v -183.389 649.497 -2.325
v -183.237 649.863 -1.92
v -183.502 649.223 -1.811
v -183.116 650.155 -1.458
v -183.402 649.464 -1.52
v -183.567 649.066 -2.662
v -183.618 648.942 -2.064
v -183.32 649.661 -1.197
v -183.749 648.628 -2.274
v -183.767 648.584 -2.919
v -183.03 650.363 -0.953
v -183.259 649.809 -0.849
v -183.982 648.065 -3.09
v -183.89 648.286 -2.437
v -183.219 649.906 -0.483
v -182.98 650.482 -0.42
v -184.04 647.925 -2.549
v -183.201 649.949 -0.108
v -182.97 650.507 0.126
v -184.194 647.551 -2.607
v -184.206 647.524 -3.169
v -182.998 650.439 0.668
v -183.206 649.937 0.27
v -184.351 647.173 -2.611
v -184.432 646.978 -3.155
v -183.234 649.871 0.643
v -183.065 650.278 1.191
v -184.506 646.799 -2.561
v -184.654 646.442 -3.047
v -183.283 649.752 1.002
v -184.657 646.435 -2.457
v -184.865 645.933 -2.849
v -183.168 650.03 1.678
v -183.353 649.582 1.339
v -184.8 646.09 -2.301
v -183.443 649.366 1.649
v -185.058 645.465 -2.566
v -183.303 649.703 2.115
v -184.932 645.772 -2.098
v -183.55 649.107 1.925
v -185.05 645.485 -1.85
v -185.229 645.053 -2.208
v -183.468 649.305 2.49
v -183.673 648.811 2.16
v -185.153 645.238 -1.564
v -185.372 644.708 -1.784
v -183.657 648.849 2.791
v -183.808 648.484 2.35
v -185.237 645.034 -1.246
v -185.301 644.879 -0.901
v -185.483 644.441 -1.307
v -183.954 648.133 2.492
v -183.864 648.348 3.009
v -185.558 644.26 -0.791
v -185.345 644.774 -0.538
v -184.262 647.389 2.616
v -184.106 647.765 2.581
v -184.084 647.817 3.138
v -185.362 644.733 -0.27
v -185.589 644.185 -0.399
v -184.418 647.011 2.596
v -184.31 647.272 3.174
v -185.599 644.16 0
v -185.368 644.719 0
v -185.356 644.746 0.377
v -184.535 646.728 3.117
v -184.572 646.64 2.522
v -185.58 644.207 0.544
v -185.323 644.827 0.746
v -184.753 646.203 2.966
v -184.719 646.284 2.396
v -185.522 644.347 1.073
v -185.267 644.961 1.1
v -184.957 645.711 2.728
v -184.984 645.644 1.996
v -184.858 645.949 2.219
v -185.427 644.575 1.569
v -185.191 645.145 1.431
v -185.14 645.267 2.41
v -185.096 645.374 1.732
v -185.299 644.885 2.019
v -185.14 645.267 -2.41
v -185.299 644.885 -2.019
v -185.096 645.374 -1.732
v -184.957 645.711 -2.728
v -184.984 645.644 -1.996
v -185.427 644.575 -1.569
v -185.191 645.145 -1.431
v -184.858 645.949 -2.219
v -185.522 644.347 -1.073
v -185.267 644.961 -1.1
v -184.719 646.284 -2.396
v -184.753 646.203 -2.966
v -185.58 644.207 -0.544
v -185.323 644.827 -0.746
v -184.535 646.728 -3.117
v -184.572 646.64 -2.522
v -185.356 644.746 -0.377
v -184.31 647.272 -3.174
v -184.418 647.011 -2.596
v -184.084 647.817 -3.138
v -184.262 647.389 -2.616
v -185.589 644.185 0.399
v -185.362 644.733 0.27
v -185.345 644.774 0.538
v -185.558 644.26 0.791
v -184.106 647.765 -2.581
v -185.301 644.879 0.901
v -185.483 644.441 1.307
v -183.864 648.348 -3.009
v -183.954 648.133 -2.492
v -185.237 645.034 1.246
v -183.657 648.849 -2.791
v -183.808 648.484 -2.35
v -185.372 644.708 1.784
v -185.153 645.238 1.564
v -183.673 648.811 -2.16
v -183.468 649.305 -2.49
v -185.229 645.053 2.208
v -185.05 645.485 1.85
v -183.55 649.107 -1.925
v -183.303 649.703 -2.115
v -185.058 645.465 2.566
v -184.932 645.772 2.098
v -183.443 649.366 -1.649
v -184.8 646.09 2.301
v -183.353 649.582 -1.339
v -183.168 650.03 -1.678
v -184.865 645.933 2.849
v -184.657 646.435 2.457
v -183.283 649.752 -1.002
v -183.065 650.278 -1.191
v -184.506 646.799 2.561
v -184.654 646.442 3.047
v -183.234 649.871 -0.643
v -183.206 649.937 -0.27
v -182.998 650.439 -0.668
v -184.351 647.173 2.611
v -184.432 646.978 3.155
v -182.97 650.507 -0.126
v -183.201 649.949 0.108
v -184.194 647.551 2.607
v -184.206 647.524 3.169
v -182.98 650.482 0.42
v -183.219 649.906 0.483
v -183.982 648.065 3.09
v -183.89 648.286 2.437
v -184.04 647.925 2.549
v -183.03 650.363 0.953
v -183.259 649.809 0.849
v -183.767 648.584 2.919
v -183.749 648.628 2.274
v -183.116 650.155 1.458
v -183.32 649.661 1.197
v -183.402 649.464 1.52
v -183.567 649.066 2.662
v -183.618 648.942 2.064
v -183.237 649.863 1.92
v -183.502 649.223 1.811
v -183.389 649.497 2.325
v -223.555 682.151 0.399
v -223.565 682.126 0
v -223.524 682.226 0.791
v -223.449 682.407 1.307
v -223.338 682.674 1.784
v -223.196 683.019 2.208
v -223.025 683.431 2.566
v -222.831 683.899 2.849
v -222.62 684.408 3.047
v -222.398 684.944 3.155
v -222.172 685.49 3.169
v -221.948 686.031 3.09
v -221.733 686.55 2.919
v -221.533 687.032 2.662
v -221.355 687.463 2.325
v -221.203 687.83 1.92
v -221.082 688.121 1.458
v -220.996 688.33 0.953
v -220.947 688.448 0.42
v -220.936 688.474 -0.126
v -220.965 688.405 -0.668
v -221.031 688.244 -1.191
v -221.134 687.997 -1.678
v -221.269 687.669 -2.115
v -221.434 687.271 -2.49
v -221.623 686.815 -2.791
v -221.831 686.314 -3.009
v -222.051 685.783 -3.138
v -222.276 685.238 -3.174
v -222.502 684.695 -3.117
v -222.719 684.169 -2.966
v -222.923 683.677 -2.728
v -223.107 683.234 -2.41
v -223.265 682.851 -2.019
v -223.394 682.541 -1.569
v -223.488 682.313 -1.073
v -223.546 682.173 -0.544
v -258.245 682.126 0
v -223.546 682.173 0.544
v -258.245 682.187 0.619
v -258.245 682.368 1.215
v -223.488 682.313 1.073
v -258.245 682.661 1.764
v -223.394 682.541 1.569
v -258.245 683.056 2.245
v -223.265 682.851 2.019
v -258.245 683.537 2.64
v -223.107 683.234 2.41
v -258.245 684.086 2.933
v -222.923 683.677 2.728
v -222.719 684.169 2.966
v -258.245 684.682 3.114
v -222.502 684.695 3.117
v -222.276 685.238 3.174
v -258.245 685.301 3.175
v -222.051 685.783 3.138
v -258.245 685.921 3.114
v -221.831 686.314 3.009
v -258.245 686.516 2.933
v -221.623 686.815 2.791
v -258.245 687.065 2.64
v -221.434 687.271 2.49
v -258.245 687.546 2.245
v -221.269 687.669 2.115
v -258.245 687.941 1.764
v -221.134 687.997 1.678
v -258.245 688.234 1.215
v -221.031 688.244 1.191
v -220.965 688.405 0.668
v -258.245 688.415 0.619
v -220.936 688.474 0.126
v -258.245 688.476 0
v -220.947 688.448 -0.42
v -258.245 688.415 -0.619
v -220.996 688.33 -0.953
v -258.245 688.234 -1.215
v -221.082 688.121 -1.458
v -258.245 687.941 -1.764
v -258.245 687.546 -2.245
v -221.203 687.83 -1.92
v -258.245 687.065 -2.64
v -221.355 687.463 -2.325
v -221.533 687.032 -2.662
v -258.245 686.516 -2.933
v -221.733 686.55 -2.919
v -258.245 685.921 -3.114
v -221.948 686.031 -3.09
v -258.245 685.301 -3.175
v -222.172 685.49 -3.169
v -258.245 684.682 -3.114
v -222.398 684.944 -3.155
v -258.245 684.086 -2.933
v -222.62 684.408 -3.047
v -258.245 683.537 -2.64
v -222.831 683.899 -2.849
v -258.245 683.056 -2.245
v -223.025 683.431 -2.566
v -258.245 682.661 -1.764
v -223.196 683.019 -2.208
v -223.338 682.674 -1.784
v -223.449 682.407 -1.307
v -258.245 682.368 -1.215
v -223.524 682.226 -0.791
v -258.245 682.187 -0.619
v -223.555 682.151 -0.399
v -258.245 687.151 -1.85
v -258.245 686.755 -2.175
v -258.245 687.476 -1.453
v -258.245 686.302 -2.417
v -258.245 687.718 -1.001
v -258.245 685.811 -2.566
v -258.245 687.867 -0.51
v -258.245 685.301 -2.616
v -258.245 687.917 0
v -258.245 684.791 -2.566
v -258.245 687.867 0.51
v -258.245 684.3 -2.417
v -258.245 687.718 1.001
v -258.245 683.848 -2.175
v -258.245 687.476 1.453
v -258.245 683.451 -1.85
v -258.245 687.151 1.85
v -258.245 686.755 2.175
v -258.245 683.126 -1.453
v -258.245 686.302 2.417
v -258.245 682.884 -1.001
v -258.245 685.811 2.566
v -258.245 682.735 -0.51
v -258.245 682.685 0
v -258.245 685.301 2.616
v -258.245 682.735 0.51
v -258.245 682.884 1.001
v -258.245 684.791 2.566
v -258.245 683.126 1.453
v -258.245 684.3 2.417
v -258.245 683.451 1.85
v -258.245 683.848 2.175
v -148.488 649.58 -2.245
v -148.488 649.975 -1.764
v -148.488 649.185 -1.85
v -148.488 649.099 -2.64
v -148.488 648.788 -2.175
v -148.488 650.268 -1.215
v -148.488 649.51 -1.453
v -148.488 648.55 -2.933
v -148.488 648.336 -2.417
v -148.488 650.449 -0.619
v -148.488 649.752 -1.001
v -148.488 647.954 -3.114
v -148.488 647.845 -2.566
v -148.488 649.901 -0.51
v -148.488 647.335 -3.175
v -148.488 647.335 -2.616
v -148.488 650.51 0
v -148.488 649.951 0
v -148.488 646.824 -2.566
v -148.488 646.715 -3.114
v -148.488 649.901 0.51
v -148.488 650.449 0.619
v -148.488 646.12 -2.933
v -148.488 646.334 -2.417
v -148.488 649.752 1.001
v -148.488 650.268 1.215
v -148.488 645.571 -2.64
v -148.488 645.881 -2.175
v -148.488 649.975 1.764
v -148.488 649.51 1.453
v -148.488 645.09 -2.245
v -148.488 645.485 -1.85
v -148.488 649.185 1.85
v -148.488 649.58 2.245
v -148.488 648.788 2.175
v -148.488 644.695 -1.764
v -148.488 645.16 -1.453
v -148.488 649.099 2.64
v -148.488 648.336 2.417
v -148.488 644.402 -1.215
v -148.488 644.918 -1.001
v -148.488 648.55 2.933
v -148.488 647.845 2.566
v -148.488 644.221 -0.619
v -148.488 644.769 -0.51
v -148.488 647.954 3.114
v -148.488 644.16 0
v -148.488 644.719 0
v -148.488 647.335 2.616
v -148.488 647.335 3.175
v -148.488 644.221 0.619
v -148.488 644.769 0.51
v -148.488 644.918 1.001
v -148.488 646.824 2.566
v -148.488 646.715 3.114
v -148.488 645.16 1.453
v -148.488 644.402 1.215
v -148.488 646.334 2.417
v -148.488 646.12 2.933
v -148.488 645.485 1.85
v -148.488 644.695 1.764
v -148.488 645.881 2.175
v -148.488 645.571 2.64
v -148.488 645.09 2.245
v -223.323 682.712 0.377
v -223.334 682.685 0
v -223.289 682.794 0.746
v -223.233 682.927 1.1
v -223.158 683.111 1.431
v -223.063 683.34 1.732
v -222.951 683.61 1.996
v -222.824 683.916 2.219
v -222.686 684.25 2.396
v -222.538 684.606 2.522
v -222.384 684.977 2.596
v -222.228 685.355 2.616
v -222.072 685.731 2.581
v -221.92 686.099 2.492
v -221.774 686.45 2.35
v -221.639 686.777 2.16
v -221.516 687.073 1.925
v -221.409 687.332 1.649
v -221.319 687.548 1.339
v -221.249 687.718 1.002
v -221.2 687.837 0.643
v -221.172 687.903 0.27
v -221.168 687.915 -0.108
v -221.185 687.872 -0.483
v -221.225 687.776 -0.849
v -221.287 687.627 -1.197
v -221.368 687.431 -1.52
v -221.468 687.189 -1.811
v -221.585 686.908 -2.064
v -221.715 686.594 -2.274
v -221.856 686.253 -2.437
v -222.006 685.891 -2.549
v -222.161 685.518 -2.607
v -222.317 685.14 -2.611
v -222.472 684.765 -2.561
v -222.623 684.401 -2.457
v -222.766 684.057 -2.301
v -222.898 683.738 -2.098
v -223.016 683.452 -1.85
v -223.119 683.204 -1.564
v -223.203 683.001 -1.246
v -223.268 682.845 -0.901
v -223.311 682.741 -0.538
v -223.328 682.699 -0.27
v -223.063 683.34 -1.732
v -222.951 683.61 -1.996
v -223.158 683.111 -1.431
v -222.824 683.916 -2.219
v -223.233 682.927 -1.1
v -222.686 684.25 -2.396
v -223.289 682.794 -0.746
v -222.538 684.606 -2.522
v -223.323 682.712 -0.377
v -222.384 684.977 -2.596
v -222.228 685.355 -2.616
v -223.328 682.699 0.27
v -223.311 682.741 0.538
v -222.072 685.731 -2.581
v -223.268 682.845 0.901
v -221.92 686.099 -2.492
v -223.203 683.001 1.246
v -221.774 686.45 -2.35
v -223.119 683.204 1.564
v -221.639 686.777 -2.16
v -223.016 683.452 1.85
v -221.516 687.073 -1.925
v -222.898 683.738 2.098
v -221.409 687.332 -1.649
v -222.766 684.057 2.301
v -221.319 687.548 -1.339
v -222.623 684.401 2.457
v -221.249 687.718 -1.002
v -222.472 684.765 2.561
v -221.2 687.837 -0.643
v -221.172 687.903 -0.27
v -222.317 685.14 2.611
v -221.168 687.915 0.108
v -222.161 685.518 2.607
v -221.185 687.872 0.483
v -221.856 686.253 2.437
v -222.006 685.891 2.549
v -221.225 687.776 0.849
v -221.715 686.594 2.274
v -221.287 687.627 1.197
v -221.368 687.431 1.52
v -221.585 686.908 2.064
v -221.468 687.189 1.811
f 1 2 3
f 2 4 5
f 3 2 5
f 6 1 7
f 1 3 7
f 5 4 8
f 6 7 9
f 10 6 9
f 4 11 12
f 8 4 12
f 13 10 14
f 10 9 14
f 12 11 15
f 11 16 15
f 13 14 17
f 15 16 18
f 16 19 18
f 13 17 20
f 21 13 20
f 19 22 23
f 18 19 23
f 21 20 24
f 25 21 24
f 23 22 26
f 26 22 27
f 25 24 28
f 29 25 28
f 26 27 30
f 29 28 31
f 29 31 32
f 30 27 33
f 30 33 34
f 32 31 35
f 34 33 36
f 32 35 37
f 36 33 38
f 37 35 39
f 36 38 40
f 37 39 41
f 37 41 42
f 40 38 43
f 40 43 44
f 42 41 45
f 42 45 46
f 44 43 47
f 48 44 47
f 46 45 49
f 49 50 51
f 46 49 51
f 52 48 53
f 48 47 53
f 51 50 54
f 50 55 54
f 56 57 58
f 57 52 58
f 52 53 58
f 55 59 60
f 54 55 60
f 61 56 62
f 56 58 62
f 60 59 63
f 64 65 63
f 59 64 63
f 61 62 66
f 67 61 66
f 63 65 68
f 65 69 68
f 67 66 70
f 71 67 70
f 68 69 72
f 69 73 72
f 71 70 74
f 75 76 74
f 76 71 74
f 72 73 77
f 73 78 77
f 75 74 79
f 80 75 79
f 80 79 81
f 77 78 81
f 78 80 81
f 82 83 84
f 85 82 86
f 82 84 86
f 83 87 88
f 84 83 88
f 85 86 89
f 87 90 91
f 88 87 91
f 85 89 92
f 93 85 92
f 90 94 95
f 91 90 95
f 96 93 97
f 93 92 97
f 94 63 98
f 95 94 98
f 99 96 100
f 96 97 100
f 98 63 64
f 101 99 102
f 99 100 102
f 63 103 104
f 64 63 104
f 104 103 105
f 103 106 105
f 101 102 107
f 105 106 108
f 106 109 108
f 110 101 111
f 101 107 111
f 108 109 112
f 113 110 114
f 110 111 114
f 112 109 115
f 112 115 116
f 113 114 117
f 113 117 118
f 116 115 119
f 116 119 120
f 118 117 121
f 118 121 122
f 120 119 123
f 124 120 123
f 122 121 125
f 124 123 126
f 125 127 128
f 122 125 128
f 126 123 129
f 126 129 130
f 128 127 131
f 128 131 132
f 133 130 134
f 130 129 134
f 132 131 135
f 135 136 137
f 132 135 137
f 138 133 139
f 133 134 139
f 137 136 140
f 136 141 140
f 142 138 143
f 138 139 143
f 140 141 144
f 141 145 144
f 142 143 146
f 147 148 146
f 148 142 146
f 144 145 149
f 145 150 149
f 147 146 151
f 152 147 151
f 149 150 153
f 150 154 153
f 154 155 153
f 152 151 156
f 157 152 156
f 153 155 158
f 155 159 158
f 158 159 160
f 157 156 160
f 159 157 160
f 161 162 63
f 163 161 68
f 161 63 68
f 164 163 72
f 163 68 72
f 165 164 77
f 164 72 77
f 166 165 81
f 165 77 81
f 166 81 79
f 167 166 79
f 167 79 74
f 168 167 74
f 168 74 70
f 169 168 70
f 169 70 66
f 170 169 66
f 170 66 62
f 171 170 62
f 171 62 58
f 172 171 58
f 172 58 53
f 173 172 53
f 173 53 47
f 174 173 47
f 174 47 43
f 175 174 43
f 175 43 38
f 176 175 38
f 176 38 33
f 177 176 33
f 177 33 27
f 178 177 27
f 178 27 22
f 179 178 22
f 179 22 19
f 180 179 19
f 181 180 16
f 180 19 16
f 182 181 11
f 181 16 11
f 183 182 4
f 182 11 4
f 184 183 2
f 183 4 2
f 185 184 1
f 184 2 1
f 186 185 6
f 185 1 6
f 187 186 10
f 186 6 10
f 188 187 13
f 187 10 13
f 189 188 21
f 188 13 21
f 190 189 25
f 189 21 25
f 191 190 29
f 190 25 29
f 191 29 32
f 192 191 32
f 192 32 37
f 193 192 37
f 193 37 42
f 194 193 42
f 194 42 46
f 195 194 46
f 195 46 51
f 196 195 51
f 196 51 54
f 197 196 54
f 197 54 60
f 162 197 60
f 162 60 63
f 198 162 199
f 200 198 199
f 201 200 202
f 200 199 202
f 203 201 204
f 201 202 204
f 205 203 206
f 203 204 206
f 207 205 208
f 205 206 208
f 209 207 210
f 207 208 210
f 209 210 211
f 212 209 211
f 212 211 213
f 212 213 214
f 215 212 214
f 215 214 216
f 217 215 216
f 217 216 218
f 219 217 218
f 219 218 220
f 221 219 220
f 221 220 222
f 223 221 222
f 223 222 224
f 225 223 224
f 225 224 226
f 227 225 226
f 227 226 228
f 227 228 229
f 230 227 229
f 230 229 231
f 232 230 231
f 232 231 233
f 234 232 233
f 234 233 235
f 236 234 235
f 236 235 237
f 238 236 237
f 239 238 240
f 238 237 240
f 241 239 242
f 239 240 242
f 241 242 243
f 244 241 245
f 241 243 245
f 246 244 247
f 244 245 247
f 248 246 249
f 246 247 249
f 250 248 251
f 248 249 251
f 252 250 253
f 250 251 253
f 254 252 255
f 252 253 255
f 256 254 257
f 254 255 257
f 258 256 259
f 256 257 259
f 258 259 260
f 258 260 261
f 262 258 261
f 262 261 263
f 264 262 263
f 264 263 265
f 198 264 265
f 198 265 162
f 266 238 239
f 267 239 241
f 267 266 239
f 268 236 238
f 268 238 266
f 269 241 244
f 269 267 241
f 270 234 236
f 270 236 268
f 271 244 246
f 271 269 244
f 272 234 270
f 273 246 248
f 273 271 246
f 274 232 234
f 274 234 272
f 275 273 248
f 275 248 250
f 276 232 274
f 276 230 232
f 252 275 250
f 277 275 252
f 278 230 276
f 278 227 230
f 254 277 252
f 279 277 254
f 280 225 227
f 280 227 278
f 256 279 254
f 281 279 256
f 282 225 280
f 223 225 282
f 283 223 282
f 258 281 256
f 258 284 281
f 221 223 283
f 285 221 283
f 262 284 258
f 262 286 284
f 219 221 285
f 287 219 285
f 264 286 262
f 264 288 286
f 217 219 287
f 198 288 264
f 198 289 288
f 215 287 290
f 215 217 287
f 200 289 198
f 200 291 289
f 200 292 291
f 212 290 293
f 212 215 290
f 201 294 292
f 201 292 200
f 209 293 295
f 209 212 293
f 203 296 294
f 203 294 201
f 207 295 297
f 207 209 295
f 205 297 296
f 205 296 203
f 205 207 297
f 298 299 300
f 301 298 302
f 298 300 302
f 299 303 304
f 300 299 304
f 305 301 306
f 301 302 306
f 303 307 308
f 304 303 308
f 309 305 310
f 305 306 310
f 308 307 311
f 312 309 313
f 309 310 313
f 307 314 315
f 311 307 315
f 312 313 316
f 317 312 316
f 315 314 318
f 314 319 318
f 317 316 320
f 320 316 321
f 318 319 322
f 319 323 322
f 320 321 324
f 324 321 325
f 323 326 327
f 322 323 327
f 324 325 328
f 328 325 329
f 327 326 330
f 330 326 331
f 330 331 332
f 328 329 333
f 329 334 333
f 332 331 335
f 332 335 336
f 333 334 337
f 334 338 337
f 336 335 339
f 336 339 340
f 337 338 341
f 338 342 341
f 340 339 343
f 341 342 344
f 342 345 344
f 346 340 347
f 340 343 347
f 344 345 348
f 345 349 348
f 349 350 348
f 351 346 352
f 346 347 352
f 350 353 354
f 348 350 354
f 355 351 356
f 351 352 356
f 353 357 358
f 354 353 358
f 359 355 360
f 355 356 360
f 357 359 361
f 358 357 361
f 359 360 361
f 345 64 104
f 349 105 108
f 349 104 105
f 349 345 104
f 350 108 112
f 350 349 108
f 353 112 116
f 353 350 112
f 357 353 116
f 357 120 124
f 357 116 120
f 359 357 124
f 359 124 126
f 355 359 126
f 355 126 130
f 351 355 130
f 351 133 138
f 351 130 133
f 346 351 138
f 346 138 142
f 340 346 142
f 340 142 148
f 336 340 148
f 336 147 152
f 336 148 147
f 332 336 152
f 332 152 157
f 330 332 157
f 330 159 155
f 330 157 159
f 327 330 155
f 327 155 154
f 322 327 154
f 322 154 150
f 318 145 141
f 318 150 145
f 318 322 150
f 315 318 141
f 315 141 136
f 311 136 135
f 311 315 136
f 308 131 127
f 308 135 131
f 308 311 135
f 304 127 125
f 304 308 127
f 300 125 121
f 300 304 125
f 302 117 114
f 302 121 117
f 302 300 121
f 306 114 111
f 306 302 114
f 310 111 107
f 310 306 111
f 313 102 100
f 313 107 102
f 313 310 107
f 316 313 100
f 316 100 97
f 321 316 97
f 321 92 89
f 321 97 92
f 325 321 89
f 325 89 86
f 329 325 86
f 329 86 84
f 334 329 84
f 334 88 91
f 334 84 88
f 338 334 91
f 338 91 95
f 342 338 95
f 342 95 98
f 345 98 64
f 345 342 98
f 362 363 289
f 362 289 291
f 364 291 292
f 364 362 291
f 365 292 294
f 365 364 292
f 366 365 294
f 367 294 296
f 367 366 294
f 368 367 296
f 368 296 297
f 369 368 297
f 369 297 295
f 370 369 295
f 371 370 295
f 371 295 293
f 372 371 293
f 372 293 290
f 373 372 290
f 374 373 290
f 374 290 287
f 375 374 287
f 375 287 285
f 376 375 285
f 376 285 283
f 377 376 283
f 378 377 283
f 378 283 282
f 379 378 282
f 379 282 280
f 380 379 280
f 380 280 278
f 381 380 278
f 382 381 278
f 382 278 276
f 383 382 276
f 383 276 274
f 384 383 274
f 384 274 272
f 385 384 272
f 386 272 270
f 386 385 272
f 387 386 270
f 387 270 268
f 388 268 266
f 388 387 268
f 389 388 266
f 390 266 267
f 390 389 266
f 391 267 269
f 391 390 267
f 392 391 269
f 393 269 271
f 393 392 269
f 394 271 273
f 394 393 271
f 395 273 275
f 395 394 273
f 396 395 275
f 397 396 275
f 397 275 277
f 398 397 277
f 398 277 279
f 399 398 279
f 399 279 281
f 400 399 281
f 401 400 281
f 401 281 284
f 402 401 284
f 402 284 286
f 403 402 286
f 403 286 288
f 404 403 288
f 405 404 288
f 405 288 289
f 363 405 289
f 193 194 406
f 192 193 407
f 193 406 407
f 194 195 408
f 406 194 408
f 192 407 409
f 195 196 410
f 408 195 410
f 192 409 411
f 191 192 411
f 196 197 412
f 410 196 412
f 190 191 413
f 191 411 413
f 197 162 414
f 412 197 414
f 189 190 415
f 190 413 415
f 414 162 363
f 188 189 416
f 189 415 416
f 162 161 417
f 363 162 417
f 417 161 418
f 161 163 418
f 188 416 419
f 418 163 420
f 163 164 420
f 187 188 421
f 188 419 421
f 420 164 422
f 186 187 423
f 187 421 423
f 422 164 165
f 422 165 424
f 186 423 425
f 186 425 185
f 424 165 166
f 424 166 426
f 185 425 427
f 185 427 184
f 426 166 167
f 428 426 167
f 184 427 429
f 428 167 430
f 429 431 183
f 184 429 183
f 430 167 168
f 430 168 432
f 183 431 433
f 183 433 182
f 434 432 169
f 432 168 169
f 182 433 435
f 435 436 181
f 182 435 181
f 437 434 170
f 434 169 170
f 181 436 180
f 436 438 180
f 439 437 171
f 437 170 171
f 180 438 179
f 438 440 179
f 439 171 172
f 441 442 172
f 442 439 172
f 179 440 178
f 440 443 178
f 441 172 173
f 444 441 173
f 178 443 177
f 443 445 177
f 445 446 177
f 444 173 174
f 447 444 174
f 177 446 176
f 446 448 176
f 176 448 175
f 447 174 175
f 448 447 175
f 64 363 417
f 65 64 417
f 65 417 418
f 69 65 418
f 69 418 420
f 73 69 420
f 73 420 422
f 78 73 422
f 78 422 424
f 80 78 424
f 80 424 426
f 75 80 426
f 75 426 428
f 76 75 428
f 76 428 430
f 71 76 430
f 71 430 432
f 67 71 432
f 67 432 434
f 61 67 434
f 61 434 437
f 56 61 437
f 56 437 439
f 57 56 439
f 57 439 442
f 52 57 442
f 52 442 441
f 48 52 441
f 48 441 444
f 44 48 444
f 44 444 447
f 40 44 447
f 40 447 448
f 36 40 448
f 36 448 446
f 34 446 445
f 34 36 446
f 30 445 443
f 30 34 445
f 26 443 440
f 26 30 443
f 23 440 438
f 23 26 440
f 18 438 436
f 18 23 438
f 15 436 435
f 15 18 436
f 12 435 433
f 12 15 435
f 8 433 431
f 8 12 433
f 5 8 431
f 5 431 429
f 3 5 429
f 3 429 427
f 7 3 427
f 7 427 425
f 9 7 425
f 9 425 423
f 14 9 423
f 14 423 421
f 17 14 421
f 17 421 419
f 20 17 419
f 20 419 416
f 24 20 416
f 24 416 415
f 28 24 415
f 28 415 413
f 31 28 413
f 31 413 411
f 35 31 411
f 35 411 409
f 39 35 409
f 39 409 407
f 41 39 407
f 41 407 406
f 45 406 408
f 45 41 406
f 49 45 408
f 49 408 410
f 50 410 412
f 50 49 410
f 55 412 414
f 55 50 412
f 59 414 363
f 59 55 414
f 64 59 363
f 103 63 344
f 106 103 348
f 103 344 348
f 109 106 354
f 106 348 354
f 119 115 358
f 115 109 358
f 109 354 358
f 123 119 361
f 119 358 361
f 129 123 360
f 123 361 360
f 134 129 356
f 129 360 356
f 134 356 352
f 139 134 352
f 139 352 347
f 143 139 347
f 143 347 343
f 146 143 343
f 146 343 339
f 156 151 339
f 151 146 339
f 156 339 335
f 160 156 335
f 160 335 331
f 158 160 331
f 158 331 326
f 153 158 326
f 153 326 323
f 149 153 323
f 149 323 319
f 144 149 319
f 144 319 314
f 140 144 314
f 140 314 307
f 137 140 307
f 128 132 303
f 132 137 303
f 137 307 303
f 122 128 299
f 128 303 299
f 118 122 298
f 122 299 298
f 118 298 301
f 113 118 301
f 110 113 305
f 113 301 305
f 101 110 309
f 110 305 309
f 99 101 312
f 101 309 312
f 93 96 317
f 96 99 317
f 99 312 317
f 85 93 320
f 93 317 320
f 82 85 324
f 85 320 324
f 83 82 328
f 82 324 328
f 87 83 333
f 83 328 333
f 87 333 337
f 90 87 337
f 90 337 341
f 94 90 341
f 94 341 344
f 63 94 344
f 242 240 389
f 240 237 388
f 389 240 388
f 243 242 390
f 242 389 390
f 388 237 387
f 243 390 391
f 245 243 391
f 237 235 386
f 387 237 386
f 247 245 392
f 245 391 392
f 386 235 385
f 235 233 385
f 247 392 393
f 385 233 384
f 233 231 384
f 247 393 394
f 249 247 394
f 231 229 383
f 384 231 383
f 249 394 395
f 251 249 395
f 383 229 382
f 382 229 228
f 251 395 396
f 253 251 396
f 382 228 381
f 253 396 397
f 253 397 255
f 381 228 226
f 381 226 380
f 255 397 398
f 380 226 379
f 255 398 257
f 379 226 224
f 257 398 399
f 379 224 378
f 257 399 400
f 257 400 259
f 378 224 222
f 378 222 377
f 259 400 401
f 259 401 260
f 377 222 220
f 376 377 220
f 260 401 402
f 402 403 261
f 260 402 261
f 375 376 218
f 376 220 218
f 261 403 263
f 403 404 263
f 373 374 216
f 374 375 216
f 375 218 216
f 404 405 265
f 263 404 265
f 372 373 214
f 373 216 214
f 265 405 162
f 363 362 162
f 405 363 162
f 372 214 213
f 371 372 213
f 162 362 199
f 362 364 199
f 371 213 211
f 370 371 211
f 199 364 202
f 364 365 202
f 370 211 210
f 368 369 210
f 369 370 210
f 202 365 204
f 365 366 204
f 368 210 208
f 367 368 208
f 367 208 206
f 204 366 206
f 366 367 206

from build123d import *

# Parameters (mm, degrees)
SKETCH1_ON_SEGMENT_1_R         = 3.175
SKETCH1_ON_SEGMENT_1_R_2       = 2.6162
PIPE_0_5_SCH_40_1_DEPTH        = 38.655870397
SKETCH1_ON_SEGMENT_2_R         = 3.175
SKETCH1_ON_SEGMENT_2_R_2       = 2.6162
PIPE_0_5_SCH_40_1_2_DEPTH      = 59.412113138
PIPE_0_5_SCH_40_1_3_DEPTH      = 35.994706883
PIPE_0_5_SCH_40_1_3_DEPTH_BACK = 2.859871939
SKETCH1_R                      = 3.175
SKETCH1_R_2                    = 2.6162


with BuildPart() as part:
    # Sketch1 on segment 1 (carried to segment 1) → Pipe 0.5 SCH 40(1) (new body)
    with BuildSketch(Plane(origin=(-148.488053197, 647.33485556, 0), x_dir=(0, -1, 0), z_dir=(-1, 0, 0))):
        Circle(SKETCH1_ON_SEGMENT_1_R)
        Circle(SKETCH1_ON_SEGMENT_1_R_2, mode=Mode.SUBTRACT)
    extrude(amount=PIPE_0_5_SCH_40_1_DEPTH)

    # Pipe 0.5 SCH 40(1) mitre 1
    split(bisect_by=Plane(origin=(-184.284051655, 647.33485556, 0), x_dir=(0.382683432, 0.923879533, 0), z_dir=(0.923879533, -0.382683432, 0)), keep=Keep.TOP)


with BuildPart() as body_2:
    # Sketch1 on segment 2 (carried to segment 2) → Pipe 0.5 SCH 40_1 2 (new body)
    with BuildSketch(Plane(origin=(-182.261816813, 645.312620718, 0), x_dir=(-0.707106781, -0.707106781, 0), z_dir=(-0.707106781, 0.707106781, 0))):
        Circle(SKETCH1_ON_SEGMENT_2_R)
        Circle(SKETCH1_ON_SEGMENT_2_R_2, mode=Mode.SUBTRACT)
    extrude(amount=PIPE_0_5_SCH_40_1_2_DEPTH)

    # Pipe 0.5 SCH 40_1 2 mitre 1
    split(bisect_by=Plane(origin=(-222.250290056, 685.301093961, 0), x_dir=(0.382683432, 0.923879533, 0), z_dir=(0.923879533, -0.382683432, 0)), keep=Keep.TOP)

    # Pipe 0.5 SCH 40_1 2 mitre 2
    split(bisect_by=Plane(origin=(-184.284051655, 647.33485556, 0), x_dir=(-0.382683432, -0.923879533, 0), z_dir=(-0.923879533, 0.382683432, 0)), keep=Keep.TOP)


with BuildPart() as body_3:
    # Sketch1 → Pipe 0.5 SCH 40_1 3 (new, two sides: drawn at the far end of the back side and taken through both)
    with BuildSketch(Plane(origin=(-222.250290056, 685.301093961, 0), x_dir=(0, -1, 0), z_dir=(-1, 0, 0)).offset(-PIPE_0_5_SCH_40_1_3_DEPTH_BACK)):
        Circle(SKETCH1_R)
        Circle(SKETCH1_R_2, mode=Mode.SUBTRACT)
    extrude(amount=PIPE_0_5_SCH_40_1_3_DEPTH + PIPE_0_5_SCH_40_1_3_DEPTH_BACK)

    # Pipe 0.5 SCH 40_1 3 mitre 1
    split(bisect_by=Plane(origin=(-222.250290056, 685.301093961, 0), x_dir=(-0.382683432, -0.923879533, 0), z_dir=(-0.923879533, 0.382683432, 0)), keep=Keep.TOP)


solid = Compound([part.part, body_2.part, body_3.part])
